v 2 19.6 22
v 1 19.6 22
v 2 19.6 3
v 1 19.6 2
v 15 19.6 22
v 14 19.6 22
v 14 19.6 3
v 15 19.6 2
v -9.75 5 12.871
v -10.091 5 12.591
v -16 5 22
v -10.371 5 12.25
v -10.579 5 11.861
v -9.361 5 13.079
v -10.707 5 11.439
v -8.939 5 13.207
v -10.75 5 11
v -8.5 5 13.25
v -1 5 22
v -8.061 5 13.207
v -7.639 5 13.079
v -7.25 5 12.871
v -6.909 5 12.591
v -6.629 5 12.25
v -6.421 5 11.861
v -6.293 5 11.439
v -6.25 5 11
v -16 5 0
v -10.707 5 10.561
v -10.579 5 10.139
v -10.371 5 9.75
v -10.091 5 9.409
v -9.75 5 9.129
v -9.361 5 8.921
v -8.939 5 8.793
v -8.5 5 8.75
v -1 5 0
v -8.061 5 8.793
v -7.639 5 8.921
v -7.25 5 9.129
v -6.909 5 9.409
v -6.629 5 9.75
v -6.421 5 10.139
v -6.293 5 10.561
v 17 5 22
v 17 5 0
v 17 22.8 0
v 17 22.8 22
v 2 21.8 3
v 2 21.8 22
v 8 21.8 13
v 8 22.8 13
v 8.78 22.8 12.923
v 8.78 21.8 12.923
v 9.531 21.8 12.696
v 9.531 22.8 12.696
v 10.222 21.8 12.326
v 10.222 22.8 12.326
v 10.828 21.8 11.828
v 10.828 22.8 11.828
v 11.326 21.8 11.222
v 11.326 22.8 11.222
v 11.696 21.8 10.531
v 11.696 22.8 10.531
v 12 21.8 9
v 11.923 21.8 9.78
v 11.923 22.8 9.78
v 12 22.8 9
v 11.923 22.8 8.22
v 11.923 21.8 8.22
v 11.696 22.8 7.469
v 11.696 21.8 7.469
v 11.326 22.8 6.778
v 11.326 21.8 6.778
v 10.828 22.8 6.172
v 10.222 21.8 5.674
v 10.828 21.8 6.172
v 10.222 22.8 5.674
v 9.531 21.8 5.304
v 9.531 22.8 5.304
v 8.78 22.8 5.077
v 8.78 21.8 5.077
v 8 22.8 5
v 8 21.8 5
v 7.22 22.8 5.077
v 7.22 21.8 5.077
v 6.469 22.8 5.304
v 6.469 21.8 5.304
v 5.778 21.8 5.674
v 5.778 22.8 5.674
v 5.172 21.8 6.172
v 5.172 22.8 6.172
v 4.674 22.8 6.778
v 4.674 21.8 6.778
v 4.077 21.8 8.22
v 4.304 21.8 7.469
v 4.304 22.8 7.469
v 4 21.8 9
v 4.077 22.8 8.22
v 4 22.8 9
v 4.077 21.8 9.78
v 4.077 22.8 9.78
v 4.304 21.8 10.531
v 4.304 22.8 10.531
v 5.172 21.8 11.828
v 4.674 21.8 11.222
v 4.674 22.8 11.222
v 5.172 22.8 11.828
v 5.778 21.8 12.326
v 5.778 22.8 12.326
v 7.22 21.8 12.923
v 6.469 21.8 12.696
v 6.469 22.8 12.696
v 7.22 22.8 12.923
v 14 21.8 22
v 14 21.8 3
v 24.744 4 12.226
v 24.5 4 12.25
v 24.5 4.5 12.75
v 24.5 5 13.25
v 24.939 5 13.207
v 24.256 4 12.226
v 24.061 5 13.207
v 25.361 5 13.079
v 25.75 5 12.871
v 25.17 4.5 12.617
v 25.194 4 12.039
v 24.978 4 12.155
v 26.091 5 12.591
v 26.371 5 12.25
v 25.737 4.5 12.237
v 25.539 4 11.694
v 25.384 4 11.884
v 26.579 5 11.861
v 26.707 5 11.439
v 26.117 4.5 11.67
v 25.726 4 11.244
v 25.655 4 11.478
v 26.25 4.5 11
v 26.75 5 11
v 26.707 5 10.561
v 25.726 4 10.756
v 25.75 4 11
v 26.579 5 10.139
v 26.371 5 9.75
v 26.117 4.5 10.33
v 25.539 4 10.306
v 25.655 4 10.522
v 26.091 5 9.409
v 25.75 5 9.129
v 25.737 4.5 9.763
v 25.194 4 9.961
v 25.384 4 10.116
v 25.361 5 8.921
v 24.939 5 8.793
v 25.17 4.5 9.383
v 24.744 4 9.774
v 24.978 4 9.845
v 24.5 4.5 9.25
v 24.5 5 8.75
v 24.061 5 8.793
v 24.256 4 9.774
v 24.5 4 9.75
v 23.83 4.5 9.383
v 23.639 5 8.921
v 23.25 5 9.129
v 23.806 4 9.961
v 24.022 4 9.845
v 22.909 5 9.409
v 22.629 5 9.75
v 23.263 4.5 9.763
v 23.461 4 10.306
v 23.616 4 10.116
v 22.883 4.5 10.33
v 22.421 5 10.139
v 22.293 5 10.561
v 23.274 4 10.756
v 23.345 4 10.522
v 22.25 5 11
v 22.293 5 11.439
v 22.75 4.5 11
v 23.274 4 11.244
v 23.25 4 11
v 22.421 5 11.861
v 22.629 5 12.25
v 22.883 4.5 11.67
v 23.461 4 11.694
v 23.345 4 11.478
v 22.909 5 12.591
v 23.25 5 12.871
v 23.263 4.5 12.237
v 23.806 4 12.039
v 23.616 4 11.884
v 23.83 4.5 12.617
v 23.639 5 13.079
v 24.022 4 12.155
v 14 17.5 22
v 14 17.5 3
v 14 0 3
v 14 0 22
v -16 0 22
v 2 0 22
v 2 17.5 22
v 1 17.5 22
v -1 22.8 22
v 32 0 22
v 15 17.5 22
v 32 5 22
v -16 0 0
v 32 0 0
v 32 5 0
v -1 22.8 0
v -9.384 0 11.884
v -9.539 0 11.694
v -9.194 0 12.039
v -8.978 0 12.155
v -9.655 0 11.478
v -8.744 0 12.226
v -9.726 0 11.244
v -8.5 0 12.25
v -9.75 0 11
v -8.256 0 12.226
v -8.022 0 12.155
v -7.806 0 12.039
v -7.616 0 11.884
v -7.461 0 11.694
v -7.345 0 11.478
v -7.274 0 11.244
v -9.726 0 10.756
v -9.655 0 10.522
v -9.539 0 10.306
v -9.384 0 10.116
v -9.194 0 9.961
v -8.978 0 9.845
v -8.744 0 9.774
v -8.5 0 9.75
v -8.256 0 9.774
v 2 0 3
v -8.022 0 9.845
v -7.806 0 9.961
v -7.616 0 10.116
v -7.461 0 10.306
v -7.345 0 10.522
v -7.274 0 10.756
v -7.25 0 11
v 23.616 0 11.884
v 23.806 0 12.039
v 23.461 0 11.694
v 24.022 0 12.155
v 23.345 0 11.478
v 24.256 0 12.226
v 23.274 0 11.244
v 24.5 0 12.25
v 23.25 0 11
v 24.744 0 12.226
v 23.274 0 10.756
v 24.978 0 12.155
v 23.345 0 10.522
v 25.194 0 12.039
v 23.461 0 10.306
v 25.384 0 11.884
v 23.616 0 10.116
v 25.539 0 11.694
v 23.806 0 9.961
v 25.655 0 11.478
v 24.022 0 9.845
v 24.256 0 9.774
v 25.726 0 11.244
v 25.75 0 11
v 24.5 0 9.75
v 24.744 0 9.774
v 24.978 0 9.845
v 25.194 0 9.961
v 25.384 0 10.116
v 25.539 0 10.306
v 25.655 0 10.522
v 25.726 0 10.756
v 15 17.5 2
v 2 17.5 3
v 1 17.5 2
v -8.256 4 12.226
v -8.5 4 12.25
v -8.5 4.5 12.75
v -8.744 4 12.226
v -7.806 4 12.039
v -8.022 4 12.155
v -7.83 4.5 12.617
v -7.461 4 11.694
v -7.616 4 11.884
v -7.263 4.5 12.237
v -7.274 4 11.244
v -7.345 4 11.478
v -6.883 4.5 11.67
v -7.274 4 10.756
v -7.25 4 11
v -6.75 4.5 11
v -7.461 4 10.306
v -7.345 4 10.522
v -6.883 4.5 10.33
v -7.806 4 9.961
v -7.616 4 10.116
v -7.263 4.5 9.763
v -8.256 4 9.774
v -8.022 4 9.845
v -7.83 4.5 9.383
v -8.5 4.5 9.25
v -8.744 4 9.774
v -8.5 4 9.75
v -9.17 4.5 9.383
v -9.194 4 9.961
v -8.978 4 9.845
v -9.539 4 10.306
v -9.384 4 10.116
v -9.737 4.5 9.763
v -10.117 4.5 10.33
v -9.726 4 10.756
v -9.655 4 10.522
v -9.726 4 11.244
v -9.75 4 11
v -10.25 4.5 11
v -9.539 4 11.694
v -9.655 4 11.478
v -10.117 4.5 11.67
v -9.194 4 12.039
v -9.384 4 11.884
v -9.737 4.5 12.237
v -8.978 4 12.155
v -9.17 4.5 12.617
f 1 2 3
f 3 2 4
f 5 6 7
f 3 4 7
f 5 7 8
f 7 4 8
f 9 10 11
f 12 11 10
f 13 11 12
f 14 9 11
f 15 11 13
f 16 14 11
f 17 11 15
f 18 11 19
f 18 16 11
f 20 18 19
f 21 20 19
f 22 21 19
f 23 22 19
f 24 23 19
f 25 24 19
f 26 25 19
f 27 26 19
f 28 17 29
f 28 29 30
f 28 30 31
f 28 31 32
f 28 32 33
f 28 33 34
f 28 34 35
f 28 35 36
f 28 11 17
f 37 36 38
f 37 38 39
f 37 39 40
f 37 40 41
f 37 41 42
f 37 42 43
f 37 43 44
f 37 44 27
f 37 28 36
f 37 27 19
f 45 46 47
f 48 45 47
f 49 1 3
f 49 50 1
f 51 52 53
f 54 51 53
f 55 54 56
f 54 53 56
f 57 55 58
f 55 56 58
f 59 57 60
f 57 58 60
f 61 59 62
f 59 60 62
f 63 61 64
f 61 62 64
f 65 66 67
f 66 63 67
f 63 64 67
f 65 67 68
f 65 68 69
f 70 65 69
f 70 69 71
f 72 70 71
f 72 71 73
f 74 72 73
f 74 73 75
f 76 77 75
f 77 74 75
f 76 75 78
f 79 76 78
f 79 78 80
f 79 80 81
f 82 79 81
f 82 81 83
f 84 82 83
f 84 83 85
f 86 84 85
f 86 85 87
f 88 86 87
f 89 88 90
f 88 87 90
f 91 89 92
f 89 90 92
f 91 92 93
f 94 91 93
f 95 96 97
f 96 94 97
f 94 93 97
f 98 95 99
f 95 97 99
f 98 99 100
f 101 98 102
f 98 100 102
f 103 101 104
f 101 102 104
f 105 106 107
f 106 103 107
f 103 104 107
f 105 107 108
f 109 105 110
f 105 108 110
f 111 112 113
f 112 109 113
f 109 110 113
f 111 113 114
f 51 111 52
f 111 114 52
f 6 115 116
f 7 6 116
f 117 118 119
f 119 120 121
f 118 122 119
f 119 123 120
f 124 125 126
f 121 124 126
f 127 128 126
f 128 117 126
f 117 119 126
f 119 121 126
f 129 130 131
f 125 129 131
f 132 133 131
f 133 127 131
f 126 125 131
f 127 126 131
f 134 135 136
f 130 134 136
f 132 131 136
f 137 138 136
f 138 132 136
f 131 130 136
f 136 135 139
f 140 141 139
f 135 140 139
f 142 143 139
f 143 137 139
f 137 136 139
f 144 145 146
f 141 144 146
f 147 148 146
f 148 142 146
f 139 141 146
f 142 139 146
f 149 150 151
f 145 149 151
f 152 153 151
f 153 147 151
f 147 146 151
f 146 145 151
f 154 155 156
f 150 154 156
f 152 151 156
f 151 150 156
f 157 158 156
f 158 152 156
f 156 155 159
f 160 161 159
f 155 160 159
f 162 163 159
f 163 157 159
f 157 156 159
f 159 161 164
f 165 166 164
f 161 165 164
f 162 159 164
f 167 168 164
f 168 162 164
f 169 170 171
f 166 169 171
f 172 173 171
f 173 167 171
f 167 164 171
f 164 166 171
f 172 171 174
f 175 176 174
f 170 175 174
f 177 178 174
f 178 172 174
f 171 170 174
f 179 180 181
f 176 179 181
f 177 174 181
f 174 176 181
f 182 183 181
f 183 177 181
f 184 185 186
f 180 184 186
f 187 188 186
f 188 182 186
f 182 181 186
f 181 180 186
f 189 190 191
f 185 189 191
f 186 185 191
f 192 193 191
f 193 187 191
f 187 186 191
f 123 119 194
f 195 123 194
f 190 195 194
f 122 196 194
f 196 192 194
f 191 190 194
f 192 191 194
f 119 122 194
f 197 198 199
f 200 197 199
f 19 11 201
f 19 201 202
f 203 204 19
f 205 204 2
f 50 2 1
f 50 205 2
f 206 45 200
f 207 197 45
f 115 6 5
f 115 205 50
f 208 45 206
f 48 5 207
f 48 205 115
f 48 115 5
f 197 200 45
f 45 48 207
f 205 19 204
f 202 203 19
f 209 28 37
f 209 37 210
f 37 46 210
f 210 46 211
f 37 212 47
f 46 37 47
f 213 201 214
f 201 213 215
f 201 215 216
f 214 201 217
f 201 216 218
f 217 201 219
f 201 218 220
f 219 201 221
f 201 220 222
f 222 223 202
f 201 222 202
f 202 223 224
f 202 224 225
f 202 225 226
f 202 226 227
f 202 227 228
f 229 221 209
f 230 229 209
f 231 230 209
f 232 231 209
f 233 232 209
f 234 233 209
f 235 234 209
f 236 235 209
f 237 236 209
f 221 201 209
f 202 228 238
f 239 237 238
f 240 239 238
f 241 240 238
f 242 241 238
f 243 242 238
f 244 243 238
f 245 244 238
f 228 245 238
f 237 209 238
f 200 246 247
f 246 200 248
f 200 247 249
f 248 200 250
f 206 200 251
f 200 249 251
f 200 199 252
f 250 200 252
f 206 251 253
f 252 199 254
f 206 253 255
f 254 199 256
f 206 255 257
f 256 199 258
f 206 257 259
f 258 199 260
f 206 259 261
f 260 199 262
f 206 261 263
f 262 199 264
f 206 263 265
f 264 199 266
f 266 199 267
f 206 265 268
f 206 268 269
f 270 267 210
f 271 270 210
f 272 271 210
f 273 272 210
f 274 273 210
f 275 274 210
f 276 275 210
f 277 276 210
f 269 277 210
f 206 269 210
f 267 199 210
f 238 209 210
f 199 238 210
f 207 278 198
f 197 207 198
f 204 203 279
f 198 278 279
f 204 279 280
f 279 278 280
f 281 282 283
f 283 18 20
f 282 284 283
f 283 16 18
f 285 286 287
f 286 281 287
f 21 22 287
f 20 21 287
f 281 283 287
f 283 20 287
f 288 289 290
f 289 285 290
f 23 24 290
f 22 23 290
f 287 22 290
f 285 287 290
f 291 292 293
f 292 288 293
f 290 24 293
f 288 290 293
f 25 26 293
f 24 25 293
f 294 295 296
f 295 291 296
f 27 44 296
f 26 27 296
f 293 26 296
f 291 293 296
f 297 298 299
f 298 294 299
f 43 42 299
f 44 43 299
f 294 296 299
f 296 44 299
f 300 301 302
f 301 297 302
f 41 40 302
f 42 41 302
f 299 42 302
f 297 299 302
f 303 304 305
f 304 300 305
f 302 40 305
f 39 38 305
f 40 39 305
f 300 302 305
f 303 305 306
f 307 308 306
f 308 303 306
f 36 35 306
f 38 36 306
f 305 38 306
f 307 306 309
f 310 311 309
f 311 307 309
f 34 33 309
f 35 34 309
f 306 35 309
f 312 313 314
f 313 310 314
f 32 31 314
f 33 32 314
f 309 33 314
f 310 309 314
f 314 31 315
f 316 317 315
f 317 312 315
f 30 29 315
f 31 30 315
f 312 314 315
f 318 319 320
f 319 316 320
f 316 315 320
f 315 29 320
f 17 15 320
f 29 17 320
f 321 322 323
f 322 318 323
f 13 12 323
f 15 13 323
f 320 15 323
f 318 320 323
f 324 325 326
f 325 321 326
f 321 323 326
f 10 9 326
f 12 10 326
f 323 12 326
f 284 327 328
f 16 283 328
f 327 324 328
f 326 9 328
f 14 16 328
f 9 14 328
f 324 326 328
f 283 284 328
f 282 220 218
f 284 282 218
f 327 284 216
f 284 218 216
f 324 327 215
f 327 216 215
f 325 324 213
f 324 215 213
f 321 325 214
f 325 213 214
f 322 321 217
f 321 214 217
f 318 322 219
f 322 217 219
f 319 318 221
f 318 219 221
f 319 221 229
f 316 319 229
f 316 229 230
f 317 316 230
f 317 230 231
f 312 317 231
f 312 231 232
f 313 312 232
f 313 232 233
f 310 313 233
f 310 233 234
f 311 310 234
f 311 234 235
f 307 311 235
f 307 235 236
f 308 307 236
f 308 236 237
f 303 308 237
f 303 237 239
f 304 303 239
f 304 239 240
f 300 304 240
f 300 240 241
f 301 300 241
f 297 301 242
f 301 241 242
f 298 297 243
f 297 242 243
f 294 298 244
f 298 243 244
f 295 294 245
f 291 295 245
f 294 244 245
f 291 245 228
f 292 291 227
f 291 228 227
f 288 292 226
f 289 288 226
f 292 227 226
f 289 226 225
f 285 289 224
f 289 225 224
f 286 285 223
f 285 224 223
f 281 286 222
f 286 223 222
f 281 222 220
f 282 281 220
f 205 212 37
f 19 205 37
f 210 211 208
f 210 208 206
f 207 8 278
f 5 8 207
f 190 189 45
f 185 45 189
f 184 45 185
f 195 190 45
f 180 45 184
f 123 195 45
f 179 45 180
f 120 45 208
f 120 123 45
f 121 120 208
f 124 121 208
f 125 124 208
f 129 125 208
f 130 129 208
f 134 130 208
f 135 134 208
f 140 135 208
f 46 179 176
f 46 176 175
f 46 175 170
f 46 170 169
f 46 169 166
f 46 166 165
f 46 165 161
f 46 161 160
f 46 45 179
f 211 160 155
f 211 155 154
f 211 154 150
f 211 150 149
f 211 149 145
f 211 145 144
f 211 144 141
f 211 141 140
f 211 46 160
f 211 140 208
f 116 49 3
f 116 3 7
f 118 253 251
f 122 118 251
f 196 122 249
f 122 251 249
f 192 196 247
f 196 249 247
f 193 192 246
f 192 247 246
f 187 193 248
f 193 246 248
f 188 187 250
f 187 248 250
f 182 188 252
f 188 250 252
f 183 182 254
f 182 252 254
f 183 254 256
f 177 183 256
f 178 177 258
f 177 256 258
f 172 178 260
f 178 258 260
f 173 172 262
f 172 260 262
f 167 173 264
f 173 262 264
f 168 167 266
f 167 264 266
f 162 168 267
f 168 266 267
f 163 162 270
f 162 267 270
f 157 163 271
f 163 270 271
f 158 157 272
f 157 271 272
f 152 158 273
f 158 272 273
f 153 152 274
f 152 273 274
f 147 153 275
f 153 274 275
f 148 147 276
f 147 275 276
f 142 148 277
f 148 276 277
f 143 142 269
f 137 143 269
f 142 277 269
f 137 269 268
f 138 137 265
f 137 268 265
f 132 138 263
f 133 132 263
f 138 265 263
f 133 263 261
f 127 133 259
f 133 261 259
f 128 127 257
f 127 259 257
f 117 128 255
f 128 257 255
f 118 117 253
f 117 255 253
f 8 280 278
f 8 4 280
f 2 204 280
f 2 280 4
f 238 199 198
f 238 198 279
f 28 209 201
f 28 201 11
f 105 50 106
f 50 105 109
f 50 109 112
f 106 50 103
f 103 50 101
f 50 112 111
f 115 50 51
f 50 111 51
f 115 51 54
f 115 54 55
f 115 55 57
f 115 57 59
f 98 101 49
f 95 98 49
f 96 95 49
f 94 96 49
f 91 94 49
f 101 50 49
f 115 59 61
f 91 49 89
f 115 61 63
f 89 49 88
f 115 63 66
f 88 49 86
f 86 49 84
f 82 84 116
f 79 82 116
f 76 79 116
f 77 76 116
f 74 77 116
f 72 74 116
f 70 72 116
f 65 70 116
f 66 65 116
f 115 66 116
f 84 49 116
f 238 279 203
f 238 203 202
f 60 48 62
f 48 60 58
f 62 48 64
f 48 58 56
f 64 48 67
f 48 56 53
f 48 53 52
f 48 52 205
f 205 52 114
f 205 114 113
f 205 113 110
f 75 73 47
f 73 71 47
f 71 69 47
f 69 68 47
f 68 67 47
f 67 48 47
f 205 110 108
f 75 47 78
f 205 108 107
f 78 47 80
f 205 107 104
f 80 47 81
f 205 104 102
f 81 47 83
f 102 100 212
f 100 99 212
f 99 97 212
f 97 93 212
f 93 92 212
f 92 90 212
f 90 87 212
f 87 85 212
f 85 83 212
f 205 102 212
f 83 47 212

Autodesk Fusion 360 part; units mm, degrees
sketch "Skizze1" plane through (0, 0, 0) normal (0, 0, 1) x (1, 0, 0)
  line L0 (0, 24) -> (16, 24)
  line L1 (16, 0) -> (0, 0)
  line L2 (2, 22) -> (14, 22)
  line L3 (0, 24) -> (-1, 24)
  line L4 (-1, 24) -> (-1, 0)
  line L5 (-1, 0) -> (0, 0)
  line L6 (16, 24) -> (17, 24)
  line L7 (17, 24) -> (17, 0)
  line L8 (17, 0) -> (16, 0)
  line L9 (2, 22) -> (1, 22)
  line L10 (1, 22) -> (1, 20)
  line L11 (1, 20) -> (2, 20)
  line L12 (15, 20) -> (15, 22)
  line L13 (15, 22) -> (14, 22)
  line L14 (15, 20) -> (2, 20)
  line L15 (2, 20) -> (2, 0)
  line L16 (14, 20) -> (14, 0)
extrude "Extrusion1" add sketch "Skizze1" along normal blind 2
sketch "Skizze2" plane through (0, 0, 2) normal (0, 0, 1) x (-1, 0, 0)
  line L0 (-17, -24) -> (1, -24)
  line L1 (1, -24) -> (1, 0)
  line L2 (1, 0) -> (-17, 0)
  line L3 (-17, 0) -> (-17, -24)
  line L4 (-2, 0) -> (-2, -20)
  line L5 (-2, -20) -> (-1, -20)
  line L6 (-1, -20) -> (-1, -22)
  line L7 (-1, -22) -> (-15, -22)
  line L8 (-15, -22) -> (-15, -20)
  line L9 (-15, -20) -> (-14, -20)
  line L10 (-14, -20) -> (-14, 0)
  line L11 (-2, -20) -> (-14, -20)
extrude "Extrusion2" add sketch "Skizze2" along normal blind 1 contours L0 L1 L2 L3 L4 L5 L6 L7 L8 L9 L10 | L2 L4 L10 L11
sketch "Skizze3" plane through (0, 0, 3) normal (0, 0, 1) x (-1, 0, 0)
  line L0 (-15, -20) -> (-1, -20)
  line L1 (-1, -20) -> (-1, -22)
  line L2 (-1, -22) -> (-15, -22)
  line L3 (-15, -22) -> (-15, -20)
  line L4 (-17, 0) -> (-17, -24)
  line L5 (-17, -24) -> (1, -24)
  line L6 (1, -24) -> (1, 0)
  line L7 (1, 0) -> (-17, 0)
  line L8 (-2, -20) -> (-2, 0)
  line L9 (-14, -20) -> (-14, 0)
extrude "Extrusion3" add sketch "Skizze3" along normal blind 19 contours L0 L1 L2 L3 L4 L5 L6 L7 L8 L9
sketch "Skizze4" plane through (0, 0, 22) normal (0, 0, 1) x (-1, 0, 0)
  line L0 (-2, -20) -> (-1, -20)
  line L1 (-1, -20) -> (-1, -22)
  line L2 (-1, -22) -> (-15, -22)
  line L3 (-15, -22) -> (-15, -20)
  line L4 (-15, -20) -> (-14, -20)
  line L5 (-14, -20) -> (-14, 0)
  line L6 (-14, 0) -> (-17, 0)
  line L7 (-17, 0) -> (-17, -24)
  line L8 (-17, -24) -> (1, -24)
  line L9 (1, -24) -> (1, 0)
  line L10 (1, 0) -> (-2, 0)
  line L11 (-2, 0) -> (-2, -20)
  line L12 (-2, -22) -> (-2, -24)
  line L13 (-14, -22) -> (-14, -24)
extrude "Extrusion4" cut sketch "Skizze4" against normal blind 19 contours L2 L8 L12 L13
sketch "Skizze5" plane through (0, 0, 3) normal (0, 0, 1) x (-1, 0, 0)
  line L0 (-14, 0) -> (-14, -20)
  line L1 (-14, -20) -> (-2, -20)
  line L2 (-2, -20) -> (-2, 0)
  line L3 (-2, 0) -> (-14, 0)
sketch "Skizze6" plane through (0, 0, 3) normal (0, 0, 1) x (1, 0, 0)
sketch "Skizze7" plane through (0, 0, 0) normal (0, 0, 1) x (1, 0, 0)
  line L0 (-1, 0) -> (-16, 0)
  line L1 (-16, 0) -> (-16, 5)
  line L2 (-16, 5) -> (-1, 5)
  line L3 (-1, 5) -> (-1, 0)
  line L4 (17, 0) -> (17, 5)
  line L5 (17, 5) -> (32, 5)
  line L6 (32, 5) -> (32, 0)
  line L7 (32, 0) -> (17, 0)
extrude "Extrusion5" add sketch "Skizze7" along normal blind 22
hole "Bohrung1" at (24.5, 5, 11) direction (0, -1, 0) diameter 2.5 depth 5 tip angle 180 countersink diameter 4.5 countersink angle 90
hole "Bohrung2" at (-8.5, 5, 11) direction (0, -1, 0) diameter 2.5 depth 5 tip angle 180 countersink diameter 4.5 countersink angle 90
extrude "Extrusion6" cut 1 faces at (14.6667, 20, 9) along direction (0, -1, 0) blind 1
extrude "Extrusion7" add 1 faces at (1.3333, 22, 9) along direction (0, -1, 0) blind 1
sketch "Skizze8" plane through (0, 0, 3) normal (0, 0, 1) x (-1, 0, 0)
  line L0 (-14, -21) -> (-14, -24)
  line L1 (-14, -24) -> (-2, -24)
  line L2 (-2, -24) -> (-2, -21)
  line L3 (-2, -21) -> (-14, -21)
  line L4 (-2, -23) -> (-14, -23)
  line L5 (-14, -23) -> (-14, -24)
  line L6 (-14, -24) -> (-2, -24)
  line L7 (-2, -24) -> (-2, -23)
  line L8 (-2, -23) -> (-14, -23)
  line L9 (-14, -23) -> (-14, -24)
extrude "Extrusion8" add sketch "Skizze8" along normal blind 19 contours L0 L1 L2 L4 L5 L6 L7 L8 L9
sketch "Skizze9" plane through (0, 24, 0) normal (0, 1, 0) x (-1, 0, 0)
  line L0 (1, 22) -> (-17, 22)
  line L1 (-17, 22) -> (-17, 0)
  line L2 (-17, 0) -> (1, 0)
  line L3 (1, 0) -> (1, 22)
  line L4 (-8, 0) -> (-8, 9)
hole "Bohrung3" at (8, 24, 9) direction (0, -1, 0) diameter 8 depth 9 tip angle 180
extrude "Extrusion9" cut 1 faces at (14.6667, 19, 9) along direction (0, -1, 0) blind 1.5
extrude "Extrusion10" add 1 faces at (1.3333, 21, 9) along direction (0, -1, 0) blind 1.4
extrude "Extrusion11" add 1 faces at (8, 23, 19) along direction (0, -1, 0) blind 1.2
extrude "Extrusion12" cut 1 faces at (8, 24, 19) along direction (0, -1, 0) blind 1.2
